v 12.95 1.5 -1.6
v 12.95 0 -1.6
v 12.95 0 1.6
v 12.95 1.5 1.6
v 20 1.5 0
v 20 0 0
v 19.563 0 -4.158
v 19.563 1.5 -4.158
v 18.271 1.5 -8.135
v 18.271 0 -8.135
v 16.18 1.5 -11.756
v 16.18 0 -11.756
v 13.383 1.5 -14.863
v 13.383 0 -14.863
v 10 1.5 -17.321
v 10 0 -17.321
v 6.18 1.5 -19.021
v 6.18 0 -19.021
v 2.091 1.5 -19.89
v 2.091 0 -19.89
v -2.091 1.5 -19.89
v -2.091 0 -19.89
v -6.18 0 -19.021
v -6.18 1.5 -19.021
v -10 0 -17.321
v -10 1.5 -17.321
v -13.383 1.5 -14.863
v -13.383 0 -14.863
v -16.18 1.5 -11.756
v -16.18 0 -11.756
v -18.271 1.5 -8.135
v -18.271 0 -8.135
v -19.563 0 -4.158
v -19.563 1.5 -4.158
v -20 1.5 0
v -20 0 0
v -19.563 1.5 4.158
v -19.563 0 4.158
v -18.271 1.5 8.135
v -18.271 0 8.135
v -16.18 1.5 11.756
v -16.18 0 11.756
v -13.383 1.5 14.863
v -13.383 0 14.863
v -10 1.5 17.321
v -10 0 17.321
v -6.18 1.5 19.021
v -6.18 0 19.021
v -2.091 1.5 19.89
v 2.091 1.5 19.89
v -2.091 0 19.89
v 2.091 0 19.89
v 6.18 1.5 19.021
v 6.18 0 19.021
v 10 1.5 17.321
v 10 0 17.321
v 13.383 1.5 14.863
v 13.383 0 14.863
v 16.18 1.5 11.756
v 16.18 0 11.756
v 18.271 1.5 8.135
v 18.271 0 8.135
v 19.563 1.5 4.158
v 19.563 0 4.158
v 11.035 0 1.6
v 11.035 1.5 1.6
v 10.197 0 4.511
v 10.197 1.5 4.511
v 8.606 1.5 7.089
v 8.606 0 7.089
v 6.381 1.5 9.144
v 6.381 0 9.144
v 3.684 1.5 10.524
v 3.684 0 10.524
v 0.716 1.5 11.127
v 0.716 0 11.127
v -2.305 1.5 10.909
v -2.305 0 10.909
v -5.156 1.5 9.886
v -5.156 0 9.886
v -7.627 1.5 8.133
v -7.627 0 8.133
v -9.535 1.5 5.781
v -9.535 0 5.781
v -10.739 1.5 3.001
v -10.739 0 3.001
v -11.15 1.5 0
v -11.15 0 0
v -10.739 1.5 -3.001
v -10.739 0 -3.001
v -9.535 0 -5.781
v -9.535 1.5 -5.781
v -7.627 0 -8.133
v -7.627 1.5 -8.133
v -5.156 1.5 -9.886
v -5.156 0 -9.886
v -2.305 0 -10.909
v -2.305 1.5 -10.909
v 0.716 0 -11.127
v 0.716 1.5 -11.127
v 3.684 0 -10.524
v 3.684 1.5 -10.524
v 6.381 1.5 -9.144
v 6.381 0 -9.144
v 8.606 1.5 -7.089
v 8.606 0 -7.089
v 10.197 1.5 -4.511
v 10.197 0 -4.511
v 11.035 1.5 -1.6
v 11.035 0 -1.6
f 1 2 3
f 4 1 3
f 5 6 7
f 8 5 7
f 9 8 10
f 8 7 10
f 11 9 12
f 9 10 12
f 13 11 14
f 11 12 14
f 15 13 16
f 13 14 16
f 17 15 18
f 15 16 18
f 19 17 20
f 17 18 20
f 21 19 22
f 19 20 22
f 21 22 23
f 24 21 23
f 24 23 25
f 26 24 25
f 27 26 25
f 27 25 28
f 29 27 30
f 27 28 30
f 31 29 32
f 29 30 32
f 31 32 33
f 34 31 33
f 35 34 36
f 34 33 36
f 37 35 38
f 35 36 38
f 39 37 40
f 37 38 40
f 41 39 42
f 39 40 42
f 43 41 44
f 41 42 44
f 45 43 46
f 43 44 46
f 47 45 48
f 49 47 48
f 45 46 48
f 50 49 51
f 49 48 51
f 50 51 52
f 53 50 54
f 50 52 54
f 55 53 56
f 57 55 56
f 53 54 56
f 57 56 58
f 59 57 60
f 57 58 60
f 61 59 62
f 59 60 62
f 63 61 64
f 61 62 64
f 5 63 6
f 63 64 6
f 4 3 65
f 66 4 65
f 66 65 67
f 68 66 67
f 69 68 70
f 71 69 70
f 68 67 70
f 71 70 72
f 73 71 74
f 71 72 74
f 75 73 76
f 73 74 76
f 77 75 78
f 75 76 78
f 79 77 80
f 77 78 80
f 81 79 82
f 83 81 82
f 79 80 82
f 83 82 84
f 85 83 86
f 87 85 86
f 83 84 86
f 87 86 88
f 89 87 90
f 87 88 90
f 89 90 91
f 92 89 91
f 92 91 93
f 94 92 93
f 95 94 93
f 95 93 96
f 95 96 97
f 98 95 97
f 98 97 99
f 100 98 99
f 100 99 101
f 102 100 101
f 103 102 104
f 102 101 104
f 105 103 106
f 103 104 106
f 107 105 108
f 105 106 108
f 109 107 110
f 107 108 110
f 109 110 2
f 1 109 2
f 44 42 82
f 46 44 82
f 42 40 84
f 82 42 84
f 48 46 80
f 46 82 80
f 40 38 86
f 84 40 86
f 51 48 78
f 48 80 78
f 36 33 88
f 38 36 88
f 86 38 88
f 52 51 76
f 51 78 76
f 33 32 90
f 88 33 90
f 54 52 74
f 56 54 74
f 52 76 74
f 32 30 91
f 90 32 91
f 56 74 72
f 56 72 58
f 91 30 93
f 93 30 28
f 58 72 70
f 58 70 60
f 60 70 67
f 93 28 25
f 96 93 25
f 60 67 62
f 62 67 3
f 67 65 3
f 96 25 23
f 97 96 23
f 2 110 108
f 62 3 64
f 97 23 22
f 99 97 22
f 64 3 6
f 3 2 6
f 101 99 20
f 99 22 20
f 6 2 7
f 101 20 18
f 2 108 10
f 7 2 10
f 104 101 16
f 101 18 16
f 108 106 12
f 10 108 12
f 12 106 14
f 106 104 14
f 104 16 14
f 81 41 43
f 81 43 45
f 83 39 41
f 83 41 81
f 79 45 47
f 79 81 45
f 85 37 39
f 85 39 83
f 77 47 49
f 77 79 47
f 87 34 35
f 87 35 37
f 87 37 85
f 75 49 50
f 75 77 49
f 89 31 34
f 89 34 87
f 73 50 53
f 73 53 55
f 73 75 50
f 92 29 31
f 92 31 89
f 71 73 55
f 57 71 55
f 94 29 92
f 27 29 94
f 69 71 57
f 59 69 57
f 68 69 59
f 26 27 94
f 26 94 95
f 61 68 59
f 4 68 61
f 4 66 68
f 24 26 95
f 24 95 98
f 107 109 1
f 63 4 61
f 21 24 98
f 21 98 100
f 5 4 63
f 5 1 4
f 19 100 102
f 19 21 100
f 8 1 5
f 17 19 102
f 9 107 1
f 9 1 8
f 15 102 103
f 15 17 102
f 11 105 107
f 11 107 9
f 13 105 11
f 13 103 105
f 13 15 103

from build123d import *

# Parameters (mm, degrees)
SKETCH1_R           = 20
BOSS_EXTRUDE1_DEPTH = 1.5


with BuildPart() as part:
    # Sketch1 → Boss-Extrude1 (new body)
    with BuildSketch(Plane(origin=(0, 0, 0), x_dir=(1, 0, 0), z_dir=(0, 1, 0))):
        Circle(SKETCH1_R)
        with BuildLine():
            Line((11.03460466, 1.6), (12.95, 1.6))
            Line((12.95, 1.6), (12.95, -1.6))
            Line((12.95, -1.6), (11.03460466, -1.6))
            ThreePointArc((11.03460466, -1.6), (-11.15, 0), (11.03460466, 1.6))
        make_face(mode=Mode.SUBTRACT)
    extrude(amount=BOSS_EXTRUDE1_DEPTH)


solid = part.part
